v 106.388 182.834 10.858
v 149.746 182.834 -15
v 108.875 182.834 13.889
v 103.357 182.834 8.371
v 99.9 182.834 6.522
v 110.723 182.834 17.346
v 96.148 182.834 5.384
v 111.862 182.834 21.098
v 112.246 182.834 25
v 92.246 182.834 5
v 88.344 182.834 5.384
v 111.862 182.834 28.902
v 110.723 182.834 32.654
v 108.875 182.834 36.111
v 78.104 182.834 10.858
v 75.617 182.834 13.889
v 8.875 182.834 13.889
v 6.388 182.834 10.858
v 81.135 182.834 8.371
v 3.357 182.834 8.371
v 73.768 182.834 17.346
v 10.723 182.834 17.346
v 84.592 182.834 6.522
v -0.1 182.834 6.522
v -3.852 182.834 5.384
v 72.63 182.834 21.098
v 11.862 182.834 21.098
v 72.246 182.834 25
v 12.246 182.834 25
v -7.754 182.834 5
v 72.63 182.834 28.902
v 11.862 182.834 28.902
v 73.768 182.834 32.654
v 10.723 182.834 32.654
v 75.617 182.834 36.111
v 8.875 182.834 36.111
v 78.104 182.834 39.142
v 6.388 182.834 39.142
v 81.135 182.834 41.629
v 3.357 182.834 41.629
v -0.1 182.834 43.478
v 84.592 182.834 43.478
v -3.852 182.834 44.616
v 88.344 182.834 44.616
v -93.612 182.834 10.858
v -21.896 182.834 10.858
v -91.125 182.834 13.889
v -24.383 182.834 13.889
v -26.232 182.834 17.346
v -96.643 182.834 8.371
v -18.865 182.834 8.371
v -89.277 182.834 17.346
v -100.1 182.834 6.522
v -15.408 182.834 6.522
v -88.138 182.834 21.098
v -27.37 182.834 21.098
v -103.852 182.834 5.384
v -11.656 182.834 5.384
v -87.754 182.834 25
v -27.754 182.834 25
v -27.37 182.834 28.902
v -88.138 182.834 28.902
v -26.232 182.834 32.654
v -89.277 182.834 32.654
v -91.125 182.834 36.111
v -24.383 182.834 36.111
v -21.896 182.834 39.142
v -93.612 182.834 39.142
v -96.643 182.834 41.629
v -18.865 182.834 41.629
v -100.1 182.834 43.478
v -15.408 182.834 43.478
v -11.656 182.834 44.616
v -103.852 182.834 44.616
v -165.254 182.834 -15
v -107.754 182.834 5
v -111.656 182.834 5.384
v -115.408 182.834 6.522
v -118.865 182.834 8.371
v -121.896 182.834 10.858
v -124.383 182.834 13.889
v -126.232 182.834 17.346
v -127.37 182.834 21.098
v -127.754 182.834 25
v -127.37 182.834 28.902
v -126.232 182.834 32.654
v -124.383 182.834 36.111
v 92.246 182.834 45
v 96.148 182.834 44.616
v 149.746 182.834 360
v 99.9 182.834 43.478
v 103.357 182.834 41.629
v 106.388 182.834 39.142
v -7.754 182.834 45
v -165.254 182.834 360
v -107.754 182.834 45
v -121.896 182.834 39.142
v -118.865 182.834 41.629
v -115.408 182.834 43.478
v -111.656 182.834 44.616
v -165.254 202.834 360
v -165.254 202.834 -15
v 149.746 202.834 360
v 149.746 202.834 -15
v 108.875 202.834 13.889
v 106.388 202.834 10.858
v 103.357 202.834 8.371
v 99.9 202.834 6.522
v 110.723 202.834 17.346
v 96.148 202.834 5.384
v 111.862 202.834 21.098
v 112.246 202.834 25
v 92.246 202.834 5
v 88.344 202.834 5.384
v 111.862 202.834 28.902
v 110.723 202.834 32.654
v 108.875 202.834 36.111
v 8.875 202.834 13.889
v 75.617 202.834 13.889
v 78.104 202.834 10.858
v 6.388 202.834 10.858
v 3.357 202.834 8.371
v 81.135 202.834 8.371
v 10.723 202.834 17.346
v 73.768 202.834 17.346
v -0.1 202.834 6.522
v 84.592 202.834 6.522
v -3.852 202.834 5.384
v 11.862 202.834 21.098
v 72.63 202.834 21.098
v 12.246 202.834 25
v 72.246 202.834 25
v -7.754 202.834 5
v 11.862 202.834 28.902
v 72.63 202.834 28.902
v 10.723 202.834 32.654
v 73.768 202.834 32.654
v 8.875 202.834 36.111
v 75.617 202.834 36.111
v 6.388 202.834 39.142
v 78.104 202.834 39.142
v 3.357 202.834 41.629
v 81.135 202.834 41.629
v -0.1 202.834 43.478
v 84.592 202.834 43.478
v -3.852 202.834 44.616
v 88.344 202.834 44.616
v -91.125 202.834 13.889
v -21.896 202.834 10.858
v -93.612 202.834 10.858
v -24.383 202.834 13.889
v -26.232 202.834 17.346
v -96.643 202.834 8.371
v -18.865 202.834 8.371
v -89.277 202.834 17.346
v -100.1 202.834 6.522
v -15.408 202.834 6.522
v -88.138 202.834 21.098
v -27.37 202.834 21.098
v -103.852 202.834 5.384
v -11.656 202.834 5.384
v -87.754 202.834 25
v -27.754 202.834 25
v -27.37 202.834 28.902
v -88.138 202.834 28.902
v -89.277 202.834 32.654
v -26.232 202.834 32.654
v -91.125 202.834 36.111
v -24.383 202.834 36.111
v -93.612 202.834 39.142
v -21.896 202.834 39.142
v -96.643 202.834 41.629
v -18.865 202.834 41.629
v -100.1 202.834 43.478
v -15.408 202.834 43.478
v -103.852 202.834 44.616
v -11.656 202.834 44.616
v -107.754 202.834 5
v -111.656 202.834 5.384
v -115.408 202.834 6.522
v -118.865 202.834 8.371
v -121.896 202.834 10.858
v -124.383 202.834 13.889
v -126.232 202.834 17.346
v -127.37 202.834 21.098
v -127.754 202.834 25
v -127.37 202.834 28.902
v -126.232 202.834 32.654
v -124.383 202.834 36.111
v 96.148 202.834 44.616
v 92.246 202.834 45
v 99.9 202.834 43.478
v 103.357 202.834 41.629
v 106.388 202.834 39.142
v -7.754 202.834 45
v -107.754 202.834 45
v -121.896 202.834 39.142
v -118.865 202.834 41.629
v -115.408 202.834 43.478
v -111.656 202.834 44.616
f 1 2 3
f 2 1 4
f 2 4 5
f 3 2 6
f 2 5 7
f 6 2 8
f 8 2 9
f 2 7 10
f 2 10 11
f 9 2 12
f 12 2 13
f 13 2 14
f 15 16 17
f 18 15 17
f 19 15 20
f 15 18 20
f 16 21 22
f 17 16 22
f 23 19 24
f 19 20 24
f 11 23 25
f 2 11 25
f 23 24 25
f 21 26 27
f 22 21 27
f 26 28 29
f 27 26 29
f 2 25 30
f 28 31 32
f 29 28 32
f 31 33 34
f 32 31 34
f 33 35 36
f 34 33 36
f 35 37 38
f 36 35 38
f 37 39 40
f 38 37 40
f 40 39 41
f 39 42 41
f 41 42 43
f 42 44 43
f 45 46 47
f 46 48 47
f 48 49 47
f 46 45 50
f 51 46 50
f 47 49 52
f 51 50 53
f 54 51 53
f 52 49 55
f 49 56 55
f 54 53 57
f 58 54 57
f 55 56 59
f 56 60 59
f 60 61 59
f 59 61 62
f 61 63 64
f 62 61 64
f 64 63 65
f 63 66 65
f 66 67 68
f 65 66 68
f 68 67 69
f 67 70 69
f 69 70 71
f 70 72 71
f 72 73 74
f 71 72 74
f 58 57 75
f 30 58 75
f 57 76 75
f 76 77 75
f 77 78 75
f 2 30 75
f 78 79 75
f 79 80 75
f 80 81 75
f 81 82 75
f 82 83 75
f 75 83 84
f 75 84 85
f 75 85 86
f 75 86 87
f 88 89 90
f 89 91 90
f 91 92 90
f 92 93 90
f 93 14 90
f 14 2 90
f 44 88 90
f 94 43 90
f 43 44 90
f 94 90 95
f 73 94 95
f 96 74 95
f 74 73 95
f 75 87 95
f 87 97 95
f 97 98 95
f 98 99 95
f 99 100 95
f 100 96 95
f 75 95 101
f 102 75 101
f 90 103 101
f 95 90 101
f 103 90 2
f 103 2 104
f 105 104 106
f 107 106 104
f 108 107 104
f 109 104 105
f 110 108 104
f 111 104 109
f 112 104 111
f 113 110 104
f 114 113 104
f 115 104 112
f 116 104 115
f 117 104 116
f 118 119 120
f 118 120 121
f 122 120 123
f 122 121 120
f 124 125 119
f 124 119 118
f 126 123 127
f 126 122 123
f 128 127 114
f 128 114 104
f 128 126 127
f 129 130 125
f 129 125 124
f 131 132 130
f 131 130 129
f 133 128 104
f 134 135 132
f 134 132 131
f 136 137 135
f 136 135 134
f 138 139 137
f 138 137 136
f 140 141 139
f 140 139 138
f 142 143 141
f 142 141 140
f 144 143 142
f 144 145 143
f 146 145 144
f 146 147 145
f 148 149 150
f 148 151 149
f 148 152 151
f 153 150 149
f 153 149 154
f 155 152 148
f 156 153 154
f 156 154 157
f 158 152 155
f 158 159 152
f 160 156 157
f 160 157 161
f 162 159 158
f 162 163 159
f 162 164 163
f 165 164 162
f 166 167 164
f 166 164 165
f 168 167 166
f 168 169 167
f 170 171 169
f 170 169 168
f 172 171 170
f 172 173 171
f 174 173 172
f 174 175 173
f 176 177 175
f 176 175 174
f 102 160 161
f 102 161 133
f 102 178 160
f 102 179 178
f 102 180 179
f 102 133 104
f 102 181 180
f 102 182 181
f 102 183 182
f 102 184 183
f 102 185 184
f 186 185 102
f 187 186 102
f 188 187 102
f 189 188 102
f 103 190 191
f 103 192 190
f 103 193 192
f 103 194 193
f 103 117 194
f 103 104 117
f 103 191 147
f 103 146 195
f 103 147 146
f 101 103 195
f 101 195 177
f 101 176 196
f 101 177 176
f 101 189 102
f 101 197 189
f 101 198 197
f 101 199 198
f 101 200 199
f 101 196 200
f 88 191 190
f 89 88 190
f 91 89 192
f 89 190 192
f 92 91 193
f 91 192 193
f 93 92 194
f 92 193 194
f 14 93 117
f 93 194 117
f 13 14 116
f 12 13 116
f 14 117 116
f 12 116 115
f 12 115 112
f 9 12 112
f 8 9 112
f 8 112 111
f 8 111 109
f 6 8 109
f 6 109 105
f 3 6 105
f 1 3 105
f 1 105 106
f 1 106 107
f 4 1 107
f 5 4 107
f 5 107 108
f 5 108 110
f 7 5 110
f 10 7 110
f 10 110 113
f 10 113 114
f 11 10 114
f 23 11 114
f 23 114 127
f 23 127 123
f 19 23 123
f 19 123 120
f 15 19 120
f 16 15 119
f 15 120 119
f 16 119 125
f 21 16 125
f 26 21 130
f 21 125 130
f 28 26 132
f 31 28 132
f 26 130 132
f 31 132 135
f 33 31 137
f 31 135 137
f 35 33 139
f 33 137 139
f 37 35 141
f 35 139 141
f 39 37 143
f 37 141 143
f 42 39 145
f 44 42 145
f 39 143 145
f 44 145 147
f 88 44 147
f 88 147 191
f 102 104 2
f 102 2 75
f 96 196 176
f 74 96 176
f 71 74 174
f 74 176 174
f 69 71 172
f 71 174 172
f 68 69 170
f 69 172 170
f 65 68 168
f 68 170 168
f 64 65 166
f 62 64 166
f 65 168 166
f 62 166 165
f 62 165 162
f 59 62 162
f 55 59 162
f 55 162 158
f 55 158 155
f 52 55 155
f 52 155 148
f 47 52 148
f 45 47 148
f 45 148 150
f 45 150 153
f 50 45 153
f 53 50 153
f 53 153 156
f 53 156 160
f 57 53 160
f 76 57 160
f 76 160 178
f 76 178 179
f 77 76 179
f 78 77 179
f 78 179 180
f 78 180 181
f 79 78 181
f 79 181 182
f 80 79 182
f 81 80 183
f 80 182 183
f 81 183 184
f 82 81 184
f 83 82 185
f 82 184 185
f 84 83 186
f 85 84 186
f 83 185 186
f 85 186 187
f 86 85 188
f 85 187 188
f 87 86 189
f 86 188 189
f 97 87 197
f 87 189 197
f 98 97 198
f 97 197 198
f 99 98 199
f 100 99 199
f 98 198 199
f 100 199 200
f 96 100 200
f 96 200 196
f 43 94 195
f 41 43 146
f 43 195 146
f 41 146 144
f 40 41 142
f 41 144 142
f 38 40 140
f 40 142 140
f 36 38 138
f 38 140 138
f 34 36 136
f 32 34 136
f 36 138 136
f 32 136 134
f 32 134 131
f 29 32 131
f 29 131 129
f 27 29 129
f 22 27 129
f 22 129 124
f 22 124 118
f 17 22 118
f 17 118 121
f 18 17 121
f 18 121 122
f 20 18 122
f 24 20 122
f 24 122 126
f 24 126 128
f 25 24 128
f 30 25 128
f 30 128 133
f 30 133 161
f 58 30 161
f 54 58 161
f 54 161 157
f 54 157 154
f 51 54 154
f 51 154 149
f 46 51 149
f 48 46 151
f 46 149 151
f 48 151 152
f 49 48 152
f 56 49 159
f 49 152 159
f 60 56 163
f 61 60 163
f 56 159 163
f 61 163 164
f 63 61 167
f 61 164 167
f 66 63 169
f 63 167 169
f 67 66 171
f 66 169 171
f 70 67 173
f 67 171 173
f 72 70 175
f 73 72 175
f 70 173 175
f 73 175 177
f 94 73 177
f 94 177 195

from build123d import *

# Parameters (mm, degrees)
CROQUIS2_W              = 315
CROQUIS2_H              = 20
SALIENTE_EXTRUIR1_DEPTH = 375
CORTAR_EXTRUIR1_REACH   = 398.622
CROQUIS3_R              = 20


with BuildPart() as part:
    # Croquis2 → Saliente-Extruir1 (new body)
    with BuildSketch(Plane(origin=(0, 0, 360), x_dir=(-1, 0, 0), z_dir=(0, 0, -1))):
        with Locations((7.754092983, 192.834413862)):
            Rectangle(CROQUIS2_W, CROQUIS2_H)
    extrude(amount=SALIENTE_EXTRUIR1_DEPTH)

    # Croquis3 → Cortar-Extruir1 (cut, up to next)
    with BuildSketch(Plane(origin=(0, 202.834413862, 0), x_dir=(1, 0, 0), z_dir=(0, 1, 0)), mode=Mode.PRIVATE) as cortar_extruir1_sk1:
        with Locations(Location((-107.754092983, -25, 0), (0, 0, 270))):
            Circle(CROQUIS3_R)
    cortar_extruir1_tool1 = extrude(cortar_extruir1_sk1.sketch, amount=-CORTAR_EXTRUIR1_REACH, mode=Mode.PRIVATE) & part.part
    # Croquis3 → Cortar-Extruir1 (cut, up to next)
    with BuildSketch(Plane(origin=(0, 202.834413862, 0), x_dir=(1, 0, 0), z_dir=(0, 1, 0)), mode=Mode.PRIVATE) as cortar_extruir1_sk2:
        with Locations(Location((-7.754092983, -25, 0), (0, 0, 270))):
            Circle(CROQUIS3_R)
    cortar_extruir1_tool2 = extrude(cortar_extruir1_sk2.sketch, amount=-CORTAR_EXTRUIR1_REACH, mode=Mode.PRIVATE) & part.part
    # Croquis3 → Cortar-Extruir1 (cut, up to next)
    with BuildSketch(Plane(origin=(0, 202.834413862, 0), x_dir=(1, 0, 0), z_dir=(0, 1, 0)), mode=Mode.PRIVATE) as cortar_extruir1_sk3:
        with Locations(Location((92.245907017, -25, 0), (0, 0, 270))):
            Circle(CROQUIS3_R)
    cortar_extruir1_tool3 = extrude(cortar_extruir1_sk3.sketch, amount=-CORTAR_EXTRUIR1_REACH, mode=Mode.PRIVATE) & part.part
    add(cortar_extruir1_tool1.solids().sort_by_distance((-107.754093, 202.834414, 25))[0], mode=Mode.SUBTRACT)
    add(cortar_extruir1_tool2.solids().sort_by_distance((-7.754093, 202.834414, 25))[0], mode=Mode.SUBTRACT)
    add(cortar_extruir1_tool3.solids().sort_by_distance((92.245907, 202.834414, 25))[0], mode=Mode.SUBTRACT)


solid = part.part
